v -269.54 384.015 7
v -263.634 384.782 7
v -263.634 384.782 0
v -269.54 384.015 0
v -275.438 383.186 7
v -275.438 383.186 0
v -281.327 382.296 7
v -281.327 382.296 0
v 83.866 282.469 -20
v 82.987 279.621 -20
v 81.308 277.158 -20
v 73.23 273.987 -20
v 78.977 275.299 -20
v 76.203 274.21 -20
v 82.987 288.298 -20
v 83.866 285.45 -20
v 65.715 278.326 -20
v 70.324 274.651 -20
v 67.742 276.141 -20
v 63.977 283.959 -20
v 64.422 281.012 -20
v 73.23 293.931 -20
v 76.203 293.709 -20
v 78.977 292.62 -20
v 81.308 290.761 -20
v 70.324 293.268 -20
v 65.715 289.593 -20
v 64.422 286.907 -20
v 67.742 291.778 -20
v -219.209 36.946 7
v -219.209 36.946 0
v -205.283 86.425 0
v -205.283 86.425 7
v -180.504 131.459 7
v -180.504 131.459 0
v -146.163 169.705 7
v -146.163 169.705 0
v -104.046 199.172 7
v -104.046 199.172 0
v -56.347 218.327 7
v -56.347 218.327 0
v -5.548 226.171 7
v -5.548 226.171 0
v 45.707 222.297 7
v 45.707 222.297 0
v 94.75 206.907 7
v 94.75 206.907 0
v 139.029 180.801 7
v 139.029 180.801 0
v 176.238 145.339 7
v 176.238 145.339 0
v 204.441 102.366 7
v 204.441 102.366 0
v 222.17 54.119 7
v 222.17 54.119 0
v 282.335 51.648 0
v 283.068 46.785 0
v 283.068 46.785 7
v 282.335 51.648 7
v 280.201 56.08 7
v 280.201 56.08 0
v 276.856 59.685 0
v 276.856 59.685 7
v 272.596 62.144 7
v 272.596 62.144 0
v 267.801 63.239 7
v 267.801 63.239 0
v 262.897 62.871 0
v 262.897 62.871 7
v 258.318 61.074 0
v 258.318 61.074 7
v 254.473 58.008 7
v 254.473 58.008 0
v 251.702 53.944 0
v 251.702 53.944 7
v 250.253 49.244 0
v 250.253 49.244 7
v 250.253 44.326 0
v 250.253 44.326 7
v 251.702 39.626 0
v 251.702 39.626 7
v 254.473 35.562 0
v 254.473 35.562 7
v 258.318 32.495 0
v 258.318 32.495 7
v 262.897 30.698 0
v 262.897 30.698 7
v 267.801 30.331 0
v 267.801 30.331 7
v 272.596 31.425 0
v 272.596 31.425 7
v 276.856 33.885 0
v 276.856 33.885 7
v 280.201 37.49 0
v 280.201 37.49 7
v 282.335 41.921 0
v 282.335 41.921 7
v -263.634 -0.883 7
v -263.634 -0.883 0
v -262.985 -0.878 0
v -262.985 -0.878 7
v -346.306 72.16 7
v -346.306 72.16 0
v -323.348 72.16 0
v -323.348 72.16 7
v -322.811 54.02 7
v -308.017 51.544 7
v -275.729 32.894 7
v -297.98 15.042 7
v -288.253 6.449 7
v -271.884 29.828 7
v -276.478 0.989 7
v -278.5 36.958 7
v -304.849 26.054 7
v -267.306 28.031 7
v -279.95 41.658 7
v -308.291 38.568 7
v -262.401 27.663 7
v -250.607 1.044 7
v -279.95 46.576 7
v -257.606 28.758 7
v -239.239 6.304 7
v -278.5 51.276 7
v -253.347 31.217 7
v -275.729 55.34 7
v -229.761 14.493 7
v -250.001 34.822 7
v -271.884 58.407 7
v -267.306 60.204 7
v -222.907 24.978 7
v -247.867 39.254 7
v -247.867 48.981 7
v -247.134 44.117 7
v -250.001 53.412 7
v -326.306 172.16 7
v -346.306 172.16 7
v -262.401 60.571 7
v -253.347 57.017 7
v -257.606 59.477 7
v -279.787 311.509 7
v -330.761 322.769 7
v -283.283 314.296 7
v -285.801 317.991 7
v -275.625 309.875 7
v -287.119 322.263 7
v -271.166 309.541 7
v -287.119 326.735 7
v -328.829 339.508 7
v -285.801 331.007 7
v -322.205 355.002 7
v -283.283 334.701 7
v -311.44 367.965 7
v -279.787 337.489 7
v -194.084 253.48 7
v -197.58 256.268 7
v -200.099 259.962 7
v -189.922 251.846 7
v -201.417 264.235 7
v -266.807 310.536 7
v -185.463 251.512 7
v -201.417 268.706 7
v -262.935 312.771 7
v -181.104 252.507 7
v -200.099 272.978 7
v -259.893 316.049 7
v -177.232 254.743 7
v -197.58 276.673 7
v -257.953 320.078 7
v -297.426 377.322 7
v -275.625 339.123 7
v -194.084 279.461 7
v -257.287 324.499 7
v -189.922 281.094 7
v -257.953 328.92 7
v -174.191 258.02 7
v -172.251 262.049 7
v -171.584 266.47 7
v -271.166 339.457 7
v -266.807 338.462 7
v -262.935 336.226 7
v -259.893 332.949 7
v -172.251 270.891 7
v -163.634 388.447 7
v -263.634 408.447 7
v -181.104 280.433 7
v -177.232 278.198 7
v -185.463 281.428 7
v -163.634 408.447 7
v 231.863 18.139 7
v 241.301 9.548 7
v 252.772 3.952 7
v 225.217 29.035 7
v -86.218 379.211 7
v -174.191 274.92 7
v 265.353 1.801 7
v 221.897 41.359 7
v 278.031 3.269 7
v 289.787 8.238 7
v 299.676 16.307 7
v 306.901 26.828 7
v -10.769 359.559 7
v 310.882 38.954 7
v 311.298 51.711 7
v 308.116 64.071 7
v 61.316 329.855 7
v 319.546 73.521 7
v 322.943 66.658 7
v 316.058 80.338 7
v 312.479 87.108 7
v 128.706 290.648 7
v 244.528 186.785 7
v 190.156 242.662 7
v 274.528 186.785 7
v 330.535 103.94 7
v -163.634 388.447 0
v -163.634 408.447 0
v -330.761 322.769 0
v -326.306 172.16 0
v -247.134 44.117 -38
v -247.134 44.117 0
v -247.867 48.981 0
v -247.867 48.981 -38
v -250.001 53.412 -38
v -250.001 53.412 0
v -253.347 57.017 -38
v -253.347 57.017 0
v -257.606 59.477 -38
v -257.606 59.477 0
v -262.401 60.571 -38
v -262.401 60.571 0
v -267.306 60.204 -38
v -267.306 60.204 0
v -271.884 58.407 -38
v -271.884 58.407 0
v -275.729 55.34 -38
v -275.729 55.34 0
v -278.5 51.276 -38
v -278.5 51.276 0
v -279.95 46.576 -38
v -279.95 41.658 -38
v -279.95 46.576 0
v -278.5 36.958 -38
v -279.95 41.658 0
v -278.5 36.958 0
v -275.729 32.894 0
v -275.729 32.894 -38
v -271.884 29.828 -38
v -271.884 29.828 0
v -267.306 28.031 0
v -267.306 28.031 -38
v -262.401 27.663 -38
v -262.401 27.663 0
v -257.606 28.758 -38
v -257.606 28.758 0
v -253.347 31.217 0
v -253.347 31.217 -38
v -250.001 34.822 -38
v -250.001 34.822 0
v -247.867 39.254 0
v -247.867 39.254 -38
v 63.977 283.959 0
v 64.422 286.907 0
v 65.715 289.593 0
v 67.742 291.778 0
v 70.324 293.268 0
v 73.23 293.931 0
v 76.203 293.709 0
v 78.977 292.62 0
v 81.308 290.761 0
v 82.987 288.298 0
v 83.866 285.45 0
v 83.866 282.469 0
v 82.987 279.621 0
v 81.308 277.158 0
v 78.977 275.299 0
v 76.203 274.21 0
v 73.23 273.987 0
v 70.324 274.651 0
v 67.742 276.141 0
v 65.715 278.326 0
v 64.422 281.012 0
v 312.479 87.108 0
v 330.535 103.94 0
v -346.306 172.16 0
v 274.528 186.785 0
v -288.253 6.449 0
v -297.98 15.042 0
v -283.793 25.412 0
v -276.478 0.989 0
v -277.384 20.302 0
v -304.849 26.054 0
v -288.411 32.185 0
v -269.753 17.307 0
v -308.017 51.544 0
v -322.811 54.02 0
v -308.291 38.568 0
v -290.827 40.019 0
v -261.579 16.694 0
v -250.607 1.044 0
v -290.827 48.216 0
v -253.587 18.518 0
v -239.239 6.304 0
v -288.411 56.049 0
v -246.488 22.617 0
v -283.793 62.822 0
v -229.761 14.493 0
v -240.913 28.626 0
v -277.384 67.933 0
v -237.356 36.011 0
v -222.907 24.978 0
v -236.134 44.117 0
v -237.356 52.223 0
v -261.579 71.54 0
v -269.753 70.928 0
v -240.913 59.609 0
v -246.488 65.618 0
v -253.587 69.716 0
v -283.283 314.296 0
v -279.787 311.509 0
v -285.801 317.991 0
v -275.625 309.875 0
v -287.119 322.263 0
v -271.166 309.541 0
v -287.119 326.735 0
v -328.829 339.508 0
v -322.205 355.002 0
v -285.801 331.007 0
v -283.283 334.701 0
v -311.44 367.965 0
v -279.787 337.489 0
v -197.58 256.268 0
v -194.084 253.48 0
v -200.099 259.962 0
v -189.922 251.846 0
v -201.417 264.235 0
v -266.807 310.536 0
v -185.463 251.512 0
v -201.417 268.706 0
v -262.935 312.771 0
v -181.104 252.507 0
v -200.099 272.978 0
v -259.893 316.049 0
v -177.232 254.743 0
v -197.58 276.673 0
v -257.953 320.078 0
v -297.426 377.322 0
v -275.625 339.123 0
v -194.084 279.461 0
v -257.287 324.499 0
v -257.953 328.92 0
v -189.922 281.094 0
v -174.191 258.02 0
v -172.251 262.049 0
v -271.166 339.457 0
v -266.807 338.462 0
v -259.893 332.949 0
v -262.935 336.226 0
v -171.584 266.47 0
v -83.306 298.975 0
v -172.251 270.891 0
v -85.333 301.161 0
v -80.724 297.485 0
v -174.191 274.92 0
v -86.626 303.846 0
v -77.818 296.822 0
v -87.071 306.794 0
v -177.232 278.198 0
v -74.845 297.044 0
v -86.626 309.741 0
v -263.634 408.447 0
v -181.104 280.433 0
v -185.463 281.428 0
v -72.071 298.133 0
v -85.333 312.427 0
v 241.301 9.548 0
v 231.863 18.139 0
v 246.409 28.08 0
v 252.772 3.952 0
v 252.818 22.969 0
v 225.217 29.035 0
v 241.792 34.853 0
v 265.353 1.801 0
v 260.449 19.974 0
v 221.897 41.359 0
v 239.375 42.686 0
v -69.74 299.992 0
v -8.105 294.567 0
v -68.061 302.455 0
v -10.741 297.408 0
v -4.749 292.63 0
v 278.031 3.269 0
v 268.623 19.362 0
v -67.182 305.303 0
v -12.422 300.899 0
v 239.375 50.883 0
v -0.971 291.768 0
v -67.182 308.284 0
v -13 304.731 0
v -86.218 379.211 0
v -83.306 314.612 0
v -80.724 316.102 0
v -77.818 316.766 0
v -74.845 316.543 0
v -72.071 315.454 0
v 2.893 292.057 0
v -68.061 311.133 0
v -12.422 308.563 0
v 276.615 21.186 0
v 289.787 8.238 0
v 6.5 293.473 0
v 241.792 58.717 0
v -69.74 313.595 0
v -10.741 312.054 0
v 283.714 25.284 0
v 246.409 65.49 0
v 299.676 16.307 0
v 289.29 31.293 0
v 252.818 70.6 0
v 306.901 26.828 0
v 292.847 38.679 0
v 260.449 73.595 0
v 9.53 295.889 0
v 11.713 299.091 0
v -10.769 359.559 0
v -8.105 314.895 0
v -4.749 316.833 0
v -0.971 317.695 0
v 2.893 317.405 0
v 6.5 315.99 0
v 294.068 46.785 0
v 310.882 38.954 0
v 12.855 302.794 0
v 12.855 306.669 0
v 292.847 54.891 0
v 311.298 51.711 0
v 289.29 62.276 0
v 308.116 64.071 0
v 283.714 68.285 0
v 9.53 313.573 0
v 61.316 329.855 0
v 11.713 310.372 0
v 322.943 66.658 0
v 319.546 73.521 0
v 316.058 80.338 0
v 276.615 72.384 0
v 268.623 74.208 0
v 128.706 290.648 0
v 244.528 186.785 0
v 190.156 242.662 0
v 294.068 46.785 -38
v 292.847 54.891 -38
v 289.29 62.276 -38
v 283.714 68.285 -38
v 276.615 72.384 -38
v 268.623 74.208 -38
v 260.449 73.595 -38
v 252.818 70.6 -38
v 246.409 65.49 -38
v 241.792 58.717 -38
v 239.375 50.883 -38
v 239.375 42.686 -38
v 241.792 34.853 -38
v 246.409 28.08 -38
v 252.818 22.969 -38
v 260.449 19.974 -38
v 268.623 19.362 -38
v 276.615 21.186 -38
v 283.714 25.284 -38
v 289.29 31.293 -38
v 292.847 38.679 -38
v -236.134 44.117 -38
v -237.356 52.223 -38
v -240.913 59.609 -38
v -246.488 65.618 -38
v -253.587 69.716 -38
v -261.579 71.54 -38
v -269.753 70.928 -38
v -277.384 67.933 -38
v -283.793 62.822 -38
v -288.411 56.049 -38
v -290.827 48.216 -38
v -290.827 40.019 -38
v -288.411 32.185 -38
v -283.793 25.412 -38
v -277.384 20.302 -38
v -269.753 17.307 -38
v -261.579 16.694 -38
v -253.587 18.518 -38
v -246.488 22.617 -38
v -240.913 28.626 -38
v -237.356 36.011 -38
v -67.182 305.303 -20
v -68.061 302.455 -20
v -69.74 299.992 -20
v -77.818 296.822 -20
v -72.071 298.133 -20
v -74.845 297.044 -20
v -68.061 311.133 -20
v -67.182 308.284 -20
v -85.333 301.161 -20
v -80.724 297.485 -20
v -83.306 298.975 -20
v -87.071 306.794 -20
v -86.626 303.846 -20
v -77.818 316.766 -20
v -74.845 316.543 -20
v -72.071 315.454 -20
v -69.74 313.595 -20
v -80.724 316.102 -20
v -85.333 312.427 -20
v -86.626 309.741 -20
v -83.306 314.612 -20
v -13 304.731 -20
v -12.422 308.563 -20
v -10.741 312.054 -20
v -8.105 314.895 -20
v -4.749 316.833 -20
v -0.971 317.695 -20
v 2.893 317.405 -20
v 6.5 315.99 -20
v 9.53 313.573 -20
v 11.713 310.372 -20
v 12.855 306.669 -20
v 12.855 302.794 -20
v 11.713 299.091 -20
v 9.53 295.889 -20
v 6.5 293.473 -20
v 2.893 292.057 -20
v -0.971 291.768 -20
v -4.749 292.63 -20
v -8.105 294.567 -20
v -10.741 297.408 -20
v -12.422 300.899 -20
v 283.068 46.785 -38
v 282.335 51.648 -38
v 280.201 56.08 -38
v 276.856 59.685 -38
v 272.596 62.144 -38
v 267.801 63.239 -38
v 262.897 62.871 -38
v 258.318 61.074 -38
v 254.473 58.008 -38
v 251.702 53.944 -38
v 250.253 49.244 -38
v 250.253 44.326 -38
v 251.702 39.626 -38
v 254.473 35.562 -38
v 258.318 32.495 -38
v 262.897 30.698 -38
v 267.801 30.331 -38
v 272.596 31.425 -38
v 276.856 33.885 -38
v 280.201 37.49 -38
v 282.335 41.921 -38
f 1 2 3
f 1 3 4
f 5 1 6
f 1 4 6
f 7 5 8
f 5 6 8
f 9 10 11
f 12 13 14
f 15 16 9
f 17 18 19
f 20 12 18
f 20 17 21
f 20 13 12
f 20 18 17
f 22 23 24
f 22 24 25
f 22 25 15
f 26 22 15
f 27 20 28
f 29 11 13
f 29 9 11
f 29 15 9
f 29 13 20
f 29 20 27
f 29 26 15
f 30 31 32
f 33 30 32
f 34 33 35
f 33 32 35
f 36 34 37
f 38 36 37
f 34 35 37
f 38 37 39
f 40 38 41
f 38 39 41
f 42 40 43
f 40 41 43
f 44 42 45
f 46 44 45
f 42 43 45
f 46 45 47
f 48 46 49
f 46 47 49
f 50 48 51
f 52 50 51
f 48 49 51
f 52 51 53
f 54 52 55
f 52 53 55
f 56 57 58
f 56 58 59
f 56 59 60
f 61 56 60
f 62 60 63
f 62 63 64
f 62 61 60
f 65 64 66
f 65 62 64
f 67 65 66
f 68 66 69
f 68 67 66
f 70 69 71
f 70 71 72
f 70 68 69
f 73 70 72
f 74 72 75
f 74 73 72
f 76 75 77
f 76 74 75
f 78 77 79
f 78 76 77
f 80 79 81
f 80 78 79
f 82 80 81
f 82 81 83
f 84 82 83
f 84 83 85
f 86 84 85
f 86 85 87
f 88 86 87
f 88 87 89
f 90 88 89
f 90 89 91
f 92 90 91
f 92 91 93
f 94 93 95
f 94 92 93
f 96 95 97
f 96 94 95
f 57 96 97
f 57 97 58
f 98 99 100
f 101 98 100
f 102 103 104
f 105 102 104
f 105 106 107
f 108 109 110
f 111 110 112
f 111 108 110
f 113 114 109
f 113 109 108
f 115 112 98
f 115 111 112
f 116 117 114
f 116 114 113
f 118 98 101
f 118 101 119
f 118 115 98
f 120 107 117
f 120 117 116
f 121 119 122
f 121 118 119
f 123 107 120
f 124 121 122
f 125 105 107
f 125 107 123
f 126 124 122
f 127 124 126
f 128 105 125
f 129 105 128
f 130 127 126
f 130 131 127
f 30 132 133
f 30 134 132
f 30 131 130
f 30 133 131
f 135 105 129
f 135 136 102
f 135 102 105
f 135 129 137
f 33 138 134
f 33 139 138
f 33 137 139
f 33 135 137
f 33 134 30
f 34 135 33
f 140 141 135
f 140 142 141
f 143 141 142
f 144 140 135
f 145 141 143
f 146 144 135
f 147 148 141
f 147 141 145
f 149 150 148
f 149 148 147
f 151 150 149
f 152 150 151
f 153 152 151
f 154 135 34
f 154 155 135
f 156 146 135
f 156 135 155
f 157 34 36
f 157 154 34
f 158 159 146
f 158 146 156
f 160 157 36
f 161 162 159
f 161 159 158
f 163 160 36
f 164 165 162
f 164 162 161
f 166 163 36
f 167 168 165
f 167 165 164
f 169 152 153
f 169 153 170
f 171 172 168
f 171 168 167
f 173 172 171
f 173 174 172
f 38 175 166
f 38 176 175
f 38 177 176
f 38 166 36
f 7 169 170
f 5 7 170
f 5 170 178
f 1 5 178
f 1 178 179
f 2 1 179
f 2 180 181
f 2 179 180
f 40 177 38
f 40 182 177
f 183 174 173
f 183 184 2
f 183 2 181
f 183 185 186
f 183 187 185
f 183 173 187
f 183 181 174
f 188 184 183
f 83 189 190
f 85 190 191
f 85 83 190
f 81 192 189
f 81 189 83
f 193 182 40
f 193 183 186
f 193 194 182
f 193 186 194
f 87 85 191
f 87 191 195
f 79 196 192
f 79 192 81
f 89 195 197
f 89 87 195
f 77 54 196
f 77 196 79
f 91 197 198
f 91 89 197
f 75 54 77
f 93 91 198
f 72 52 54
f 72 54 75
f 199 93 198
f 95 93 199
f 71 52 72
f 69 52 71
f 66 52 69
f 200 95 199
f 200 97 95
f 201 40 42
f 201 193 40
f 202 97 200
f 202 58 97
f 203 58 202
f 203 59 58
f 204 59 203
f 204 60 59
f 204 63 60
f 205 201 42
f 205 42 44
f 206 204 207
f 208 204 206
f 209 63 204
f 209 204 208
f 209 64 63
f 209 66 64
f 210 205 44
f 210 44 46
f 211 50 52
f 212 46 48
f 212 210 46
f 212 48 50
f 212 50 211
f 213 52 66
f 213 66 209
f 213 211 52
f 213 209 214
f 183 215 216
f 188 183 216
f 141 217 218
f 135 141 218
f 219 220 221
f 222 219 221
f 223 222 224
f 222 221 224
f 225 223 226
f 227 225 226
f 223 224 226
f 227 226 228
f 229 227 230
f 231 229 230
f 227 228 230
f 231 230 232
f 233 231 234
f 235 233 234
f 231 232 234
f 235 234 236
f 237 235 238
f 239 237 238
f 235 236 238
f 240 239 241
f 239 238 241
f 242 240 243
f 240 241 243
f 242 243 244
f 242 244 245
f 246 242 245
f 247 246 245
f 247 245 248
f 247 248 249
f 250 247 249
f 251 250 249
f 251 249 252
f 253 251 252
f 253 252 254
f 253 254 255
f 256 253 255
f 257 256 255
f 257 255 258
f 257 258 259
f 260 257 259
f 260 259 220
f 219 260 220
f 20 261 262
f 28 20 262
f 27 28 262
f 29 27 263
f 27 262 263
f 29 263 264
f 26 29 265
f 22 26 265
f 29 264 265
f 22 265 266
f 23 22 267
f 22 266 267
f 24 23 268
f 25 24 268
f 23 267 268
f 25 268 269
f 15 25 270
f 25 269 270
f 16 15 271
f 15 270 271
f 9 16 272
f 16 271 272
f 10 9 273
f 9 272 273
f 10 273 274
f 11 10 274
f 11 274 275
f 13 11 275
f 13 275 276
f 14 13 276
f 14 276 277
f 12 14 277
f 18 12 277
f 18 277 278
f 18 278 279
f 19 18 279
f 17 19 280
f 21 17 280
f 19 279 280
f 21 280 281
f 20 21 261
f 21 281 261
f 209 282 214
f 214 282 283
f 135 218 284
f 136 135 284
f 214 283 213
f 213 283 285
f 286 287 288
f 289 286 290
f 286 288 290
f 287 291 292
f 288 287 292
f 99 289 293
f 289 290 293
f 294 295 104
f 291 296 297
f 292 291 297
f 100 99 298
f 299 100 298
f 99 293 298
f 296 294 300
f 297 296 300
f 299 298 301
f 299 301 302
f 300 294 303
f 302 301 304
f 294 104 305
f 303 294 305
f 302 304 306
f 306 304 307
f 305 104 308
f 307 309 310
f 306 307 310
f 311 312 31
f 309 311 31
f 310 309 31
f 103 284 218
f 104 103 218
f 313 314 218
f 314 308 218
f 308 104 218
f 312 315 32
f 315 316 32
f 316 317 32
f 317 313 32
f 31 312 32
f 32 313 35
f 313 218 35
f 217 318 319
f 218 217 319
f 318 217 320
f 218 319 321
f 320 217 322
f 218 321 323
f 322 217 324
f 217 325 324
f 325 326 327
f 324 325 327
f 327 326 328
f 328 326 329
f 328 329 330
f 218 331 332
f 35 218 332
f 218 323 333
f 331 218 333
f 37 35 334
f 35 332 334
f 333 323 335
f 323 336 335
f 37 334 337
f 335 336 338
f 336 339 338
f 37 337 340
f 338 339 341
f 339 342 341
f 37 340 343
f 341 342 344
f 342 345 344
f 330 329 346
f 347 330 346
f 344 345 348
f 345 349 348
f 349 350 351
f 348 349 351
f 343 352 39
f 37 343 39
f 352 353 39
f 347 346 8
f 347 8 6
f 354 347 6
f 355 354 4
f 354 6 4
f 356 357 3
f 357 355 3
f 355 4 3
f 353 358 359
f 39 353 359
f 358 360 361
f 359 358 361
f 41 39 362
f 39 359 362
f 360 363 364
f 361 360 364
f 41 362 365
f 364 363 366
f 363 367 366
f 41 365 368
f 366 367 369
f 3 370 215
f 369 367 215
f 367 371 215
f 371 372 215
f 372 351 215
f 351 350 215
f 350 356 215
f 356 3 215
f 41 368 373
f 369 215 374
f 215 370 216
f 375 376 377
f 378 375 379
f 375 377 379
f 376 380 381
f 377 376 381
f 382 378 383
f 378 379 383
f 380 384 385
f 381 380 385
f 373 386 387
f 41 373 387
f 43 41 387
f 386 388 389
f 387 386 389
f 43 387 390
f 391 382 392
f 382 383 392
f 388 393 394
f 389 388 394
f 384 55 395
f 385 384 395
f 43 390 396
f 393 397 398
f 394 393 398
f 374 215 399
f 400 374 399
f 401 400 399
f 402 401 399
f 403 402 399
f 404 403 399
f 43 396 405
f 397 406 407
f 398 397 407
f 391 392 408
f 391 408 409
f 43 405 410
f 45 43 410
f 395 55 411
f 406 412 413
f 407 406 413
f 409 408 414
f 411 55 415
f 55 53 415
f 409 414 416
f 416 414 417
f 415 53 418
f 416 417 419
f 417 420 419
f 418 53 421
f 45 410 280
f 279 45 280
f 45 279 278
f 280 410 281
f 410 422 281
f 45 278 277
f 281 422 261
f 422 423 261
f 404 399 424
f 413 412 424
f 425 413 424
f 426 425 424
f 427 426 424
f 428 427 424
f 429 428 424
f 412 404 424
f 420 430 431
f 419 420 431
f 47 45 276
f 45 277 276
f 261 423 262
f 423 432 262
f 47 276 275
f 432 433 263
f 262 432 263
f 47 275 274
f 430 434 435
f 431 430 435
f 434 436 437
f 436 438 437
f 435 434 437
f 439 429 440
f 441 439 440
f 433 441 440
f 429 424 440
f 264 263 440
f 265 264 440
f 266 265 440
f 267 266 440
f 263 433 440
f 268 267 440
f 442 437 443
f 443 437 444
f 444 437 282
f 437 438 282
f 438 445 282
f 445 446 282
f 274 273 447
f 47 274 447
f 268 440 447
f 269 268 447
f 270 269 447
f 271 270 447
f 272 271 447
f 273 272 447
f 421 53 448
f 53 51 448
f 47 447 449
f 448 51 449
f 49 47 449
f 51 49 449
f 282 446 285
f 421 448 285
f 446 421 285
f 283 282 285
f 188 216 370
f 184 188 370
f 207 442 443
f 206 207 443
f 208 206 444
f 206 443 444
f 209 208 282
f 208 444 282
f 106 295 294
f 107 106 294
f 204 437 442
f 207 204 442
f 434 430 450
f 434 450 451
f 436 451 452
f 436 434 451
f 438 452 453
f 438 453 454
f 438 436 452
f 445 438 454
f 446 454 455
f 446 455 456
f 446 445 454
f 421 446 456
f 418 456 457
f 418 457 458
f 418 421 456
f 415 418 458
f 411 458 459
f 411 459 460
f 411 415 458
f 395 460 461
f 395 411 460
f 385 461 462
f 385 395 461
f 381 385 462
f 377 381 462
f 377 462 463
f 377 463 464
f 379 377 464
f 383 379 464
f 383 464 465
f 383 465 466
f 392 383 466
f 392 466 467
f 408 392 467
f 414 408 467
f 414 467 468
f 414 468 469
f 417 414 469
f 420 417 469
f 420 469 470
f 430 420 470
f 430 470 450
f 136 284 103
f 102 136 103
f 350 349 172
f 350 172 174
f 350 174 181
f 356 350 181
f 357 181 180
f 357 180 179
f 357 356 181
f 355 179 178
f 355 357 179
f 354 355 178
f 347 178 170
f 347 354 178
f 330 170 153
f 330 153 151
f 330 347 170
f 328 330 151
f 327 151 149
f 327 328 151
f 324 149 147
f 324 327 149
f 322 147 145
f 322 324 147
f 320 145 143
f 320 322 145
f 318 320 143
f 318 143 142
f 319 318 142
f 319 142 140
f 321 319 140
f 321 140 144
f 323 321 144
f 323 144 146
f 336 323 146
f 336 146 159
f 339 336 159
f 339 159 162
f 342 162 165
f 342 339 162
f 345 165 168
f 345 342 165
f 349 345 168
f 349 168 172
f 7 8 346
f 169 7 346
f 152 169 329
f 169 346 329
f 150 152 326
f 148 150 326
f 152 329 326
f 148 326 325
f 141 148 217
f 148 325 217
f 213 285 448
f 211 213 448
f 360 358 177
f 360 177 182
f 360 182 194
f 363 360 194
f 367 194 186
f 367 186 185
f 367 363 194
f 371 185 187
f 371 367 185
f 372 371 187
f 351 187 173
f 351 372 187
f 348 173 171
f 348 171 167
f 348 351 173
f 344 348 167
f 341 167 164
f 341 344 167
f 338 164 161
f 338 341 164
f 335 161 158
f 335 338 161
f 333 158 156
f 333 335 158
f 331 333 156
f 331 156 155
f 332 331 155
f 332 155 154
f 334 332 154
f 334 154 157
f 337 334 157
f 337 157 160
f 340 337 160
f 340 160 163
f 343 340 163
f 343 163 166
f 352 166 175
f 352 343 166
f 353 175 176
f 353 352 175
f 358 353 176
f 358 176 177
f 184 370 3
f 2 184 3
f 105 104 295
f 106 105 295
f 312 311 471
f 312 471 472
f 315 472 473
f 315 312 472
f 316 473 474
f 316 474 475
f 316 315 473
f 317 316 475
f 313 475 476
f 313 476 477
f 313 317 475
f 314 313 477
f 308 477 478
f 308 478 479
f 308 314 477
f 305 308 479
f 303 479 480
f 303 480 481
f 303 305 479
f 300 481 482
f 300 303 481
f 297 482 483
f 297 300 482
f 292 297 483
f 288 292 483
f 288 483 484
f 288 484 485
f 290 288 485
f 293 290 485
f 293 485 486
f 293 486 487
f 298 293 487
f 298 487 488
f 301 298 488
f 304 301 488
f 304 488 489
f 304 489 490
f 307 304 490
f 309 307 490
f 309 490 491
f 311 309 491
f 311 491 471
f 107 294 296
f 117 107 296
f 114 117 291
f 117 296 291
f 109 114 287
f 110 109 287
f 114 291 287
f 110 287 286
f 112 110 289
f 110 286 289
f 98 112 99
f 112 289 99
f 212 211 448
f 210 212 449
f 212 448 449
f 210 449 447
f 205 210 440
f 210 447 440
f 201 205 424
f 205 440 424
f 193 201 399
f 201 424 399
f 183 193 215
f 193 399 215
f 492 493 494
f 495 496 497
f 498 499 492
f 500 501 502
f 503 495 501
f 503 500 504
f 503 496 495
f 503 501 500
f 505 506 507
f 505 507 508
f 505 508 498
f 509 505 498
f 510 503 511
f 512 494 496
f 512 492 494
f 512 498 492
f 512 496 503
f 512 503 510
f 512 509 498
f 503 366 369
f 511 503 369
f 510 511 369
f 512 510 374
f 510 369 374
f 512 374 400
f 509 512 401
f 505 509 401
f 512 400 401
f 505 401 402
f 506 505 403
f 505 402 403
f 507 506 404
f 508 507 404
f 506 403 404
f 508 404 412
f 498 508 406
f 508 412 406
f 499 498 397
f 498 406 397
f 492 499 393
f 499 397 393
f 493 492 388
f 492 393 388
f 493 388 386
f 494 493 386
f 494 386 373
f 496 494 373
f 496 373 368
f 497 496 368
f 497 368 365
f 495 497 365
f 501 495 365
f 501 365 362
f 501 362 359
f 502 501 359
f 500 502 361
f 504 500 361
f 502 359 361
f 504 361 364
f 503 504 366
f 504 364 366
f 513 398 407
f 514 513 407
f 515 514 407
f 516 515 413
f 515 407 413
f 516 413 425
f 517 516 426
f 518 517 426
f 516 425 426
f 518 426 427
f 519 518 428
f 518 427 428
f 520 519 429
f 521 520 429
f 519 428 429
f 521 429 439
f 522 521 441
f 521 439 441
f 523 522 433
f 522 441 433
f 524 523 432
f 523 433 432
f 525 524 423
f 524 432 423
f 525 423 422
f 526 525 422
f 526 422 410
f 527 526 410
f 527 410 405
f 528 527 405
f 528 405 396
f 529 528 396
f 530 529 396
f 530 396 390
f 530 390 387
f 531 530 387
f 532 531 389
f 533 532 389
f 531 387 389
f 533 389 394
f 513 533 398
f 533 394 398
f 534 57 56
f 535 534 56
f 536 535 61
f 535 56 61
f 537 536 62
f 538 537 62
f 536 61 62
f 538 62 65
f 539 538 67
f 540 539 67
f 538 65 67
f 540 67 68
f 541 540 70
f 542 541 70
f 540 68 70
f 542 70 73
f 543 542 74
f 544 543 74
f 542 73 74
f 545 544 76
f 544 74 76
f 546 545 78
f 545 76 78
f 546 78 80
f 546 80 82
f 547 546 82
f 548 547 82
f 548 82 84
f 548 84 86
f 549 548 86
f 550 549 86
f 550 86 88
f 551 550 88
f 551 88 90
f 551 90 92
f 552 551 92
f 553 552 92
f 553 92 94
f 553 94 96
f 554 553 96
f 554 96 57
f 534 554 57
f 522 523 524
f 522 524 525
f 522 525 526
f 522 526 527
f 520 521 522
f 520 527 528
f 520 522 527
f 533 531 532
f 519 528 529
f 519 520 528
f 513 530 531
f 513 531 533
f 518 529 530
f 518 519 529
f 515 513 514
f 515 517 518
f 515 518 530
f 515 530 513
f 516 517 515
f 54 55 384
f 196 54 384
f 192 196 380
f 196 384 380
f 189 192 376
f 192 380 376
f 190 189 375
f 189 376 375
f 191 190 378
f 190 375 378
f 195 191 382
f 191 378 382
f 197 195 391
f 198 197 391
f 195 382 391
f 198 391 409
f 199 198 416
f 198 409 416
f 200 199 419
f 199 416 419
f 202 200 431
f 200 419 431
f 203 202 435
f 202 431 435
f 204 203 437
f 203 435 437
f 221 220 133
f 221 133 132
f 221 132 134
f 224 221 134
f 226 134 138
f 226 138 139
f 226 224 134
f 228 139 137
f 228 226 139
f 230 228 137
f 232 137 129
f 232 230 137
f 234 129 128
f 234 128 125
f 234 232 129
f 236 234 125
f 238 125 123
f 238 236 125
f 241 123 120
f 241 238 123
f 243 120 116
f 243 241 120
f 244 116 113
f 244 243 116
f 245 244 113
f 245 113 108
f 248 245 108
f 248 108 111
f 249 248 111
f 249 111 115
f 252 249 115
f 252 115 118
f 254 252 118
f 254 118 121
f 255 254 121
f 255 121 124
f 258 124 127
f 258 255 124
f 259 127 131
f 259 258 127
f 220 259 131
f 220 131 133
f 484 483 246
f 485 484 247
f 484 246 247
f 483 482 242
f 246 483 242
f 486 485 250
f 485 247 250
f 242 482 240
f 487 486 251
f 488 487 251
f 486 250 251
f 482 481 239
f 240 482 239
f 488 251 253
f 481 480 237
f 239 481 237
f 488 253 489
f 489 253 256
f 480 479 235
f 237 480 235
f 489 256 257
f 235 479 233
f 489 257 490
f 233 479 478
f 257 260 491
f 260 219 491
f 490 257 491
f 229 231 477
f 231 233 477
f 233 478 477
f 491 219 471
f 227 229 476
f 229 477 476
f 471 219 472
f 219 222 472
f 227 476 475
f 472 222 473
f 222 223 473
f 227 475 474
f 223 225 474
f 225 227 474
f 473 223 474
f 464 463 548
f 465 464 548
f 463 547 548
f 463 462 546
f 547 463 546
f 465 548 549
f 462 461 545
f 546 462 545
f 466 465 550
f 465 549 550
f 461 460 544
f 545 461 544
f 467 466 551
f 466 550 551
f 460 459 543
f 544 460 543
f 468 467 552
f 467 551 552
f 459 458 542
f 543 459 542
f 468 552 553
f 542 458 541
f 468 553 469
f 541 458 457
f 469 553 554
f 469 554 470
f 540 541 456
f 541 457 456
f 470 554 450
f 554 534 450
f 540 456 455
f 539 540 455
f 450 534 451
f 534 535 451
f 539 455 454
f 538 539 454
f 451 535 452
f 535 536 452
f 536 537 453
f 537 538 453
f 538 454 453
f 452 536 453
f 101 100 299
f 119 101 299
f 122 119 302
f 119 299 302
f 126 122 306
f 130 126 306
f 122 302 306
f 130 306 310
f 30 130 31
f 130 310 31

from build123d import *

# Parameters (mm, degrees)
SKETCH1_R            = 16.5
SKETCH1_R_2          = 15
BOSS_EXTRUDE3_DEPTH  = 7
SKETCH2_R            = 27.5
SKETCH2_R_2          = 16.5
BOSS_EXTRUDE4_DEPTH  = 45
SKETCH4_R            = 10
SKETCH4_R_2          = 13
BOSS_EXTRUDE10_DEPTH = 20
BOSS_EXTRUDE11_DEPTH = 7
BOSS_EXTRUDE12_DEPTH = 7
BOSS_EXTRUDE13_DEPTH = 7


with BuildPart() as part:
    # Sketch1 → Boss-Extrude3 (new body)
    with BuildSketch(Plane.XY):
        with BuildLine():
            Line((-322.811275448, 54.020092964), (-308.016991909, 51.544375984))
            ThreePointArc((-308.016991909, 51.544375984), (-297.979605272, 15.041649319), (-263.634141291, -0.882774953))
            Line((-263.634141291, -0.882774953), (-262.985194212, -0.878095462))
            ThreePointArc((-262.985194212, -0.878095462), (-234.213459723, 10.066916736), (-219.209238471, 36.945892575))
            ThreePointArc((-219.209238471, 36.945892575), (-5.54789332, 226.171081865), (222.17000985, 54.119057031))
            ThreePointArc((222.17000985, 54.119057031), (271.744200091, 2.083431527), (308.115870104, 64.070593748))
            Line((308.115870104, 64.070593748), (322.942948353, 66.658271071))
            ThreePointArc((322.942948353, 66.658271071), (72.802770658, 324.018256719), (-281.327086526, 382.296168148))
            ThreePointArc((-281.327086526, 382.296168148), (-317.291599122, 361.87304371), (-330.761322011, 322.769121357))
            Line((-330.761322011, 322.769121357), (-322.811275448, 54.020092964))
        make_face()
        with Locations((-263.634141291, 44.117225047)):
            Circle(SKETCH1_R, mode=Mode.SUBTRACT)
        with Locations((266.5683015, 46.784774614)):
            Circle(SKETCH1_R, mode=Mode.SUBTRACT)
        with Locations((-186.584414745, 266.470160007)):
            Circle(SKETCH1_R_2, mode=Mode.SUBTRACT)
        with Locations((-272.286901184, 324.498892702)):
            Circle(SKETCH1_R_2, mode=Mode.SUBTRACT)
    extrude(amount=BOSS_EXTRUDE3_DEPTH)

    # Sketch2 → Boss-Extrude4 (add)
    with BuildSketch(Plane.XY.offset(7)):
        with Locations((-263.634141291, 44.117225047)):
            Circle(SKETCH2_R)
        with Locations((-263.634141291, 44.117225047)):
            Circle(SKETCH2_R_2, mode=Mode.SUBTRACT)
        with Locations((266.5683015, 46.784774614)):
            Circle(SKETCH2_R)
        with Locations((266.5683015, 46.784774614)):
            Circle(SKETCH2_R_2, mode=Mode.SUBTRACT)
    extrude(amount=-BOSS_EXTRUDE4_DEPTH)

    # Sketch4 → Boss-Extrude10 (add)
    with BuildSketch(Plane(origin=(0, 0, 0), x_dir=(-1, 0, 0), z_dir=(0, 0, -1))):
        with Locations((-73.977350909, 283.959387959)):
            Circle(SKETCH4_R)
        with Locations((77.070617643, 306.793749247)):
            Circle(SKETCH4_R)
        with Locations((0, 304.731170723)):
            Circle(SKETCH4_R_2)
    extrude(amount=BOSS_EXTRUDE10_DEPTH)

    # Sketch6 → Boss-Extrude11 (add)
    with BuildSketch(Plane(origin=(0, 0, 0), x_dir=(-1, 0, 0), z_dir=(0, 0, -1))):
        Polygon((-244.528320181, 186.784774614), (-312.13241104, 86.784774614), (-330.534833245, 103.93991663), (-274.528320181, 186.784774614), align=None)
    extrude(amount=-BOSS_EXTRUDE11_DEPTH)

    # Sketch9 → Boss-Extrude12 (add)
    with BuildSketch(Plane(origin=(0, 0, 0), x_dir=(-1, 0, 0), z_dir=(0, 0, -1))):
        Polygon((326.306060919, 172.160306644), (346.306060919, 172.160306644), (346.306060919, 72.160306644), (323.347893363, 72.160306644), align=None)
    extrude(amount=-BOSS_EXTRUDE12_DEPTH)

    # Sketch10 → Boss-Extrude13 (add)
    with BuildSketch(Plane(origin=(0, 0, 0), x_dir=(-1, 0, 0), z_dir=(0, 0, -1))):
        Polygon((163.634141291, 388.447481806), (163.634141291, 408.447481806), (263.634141291, 408.447481806), (263.634141291, 384.173082441), align=None)
    extrude(amount=-BOSS_EXTRUDE13_DEPTH)


solid = part.part
